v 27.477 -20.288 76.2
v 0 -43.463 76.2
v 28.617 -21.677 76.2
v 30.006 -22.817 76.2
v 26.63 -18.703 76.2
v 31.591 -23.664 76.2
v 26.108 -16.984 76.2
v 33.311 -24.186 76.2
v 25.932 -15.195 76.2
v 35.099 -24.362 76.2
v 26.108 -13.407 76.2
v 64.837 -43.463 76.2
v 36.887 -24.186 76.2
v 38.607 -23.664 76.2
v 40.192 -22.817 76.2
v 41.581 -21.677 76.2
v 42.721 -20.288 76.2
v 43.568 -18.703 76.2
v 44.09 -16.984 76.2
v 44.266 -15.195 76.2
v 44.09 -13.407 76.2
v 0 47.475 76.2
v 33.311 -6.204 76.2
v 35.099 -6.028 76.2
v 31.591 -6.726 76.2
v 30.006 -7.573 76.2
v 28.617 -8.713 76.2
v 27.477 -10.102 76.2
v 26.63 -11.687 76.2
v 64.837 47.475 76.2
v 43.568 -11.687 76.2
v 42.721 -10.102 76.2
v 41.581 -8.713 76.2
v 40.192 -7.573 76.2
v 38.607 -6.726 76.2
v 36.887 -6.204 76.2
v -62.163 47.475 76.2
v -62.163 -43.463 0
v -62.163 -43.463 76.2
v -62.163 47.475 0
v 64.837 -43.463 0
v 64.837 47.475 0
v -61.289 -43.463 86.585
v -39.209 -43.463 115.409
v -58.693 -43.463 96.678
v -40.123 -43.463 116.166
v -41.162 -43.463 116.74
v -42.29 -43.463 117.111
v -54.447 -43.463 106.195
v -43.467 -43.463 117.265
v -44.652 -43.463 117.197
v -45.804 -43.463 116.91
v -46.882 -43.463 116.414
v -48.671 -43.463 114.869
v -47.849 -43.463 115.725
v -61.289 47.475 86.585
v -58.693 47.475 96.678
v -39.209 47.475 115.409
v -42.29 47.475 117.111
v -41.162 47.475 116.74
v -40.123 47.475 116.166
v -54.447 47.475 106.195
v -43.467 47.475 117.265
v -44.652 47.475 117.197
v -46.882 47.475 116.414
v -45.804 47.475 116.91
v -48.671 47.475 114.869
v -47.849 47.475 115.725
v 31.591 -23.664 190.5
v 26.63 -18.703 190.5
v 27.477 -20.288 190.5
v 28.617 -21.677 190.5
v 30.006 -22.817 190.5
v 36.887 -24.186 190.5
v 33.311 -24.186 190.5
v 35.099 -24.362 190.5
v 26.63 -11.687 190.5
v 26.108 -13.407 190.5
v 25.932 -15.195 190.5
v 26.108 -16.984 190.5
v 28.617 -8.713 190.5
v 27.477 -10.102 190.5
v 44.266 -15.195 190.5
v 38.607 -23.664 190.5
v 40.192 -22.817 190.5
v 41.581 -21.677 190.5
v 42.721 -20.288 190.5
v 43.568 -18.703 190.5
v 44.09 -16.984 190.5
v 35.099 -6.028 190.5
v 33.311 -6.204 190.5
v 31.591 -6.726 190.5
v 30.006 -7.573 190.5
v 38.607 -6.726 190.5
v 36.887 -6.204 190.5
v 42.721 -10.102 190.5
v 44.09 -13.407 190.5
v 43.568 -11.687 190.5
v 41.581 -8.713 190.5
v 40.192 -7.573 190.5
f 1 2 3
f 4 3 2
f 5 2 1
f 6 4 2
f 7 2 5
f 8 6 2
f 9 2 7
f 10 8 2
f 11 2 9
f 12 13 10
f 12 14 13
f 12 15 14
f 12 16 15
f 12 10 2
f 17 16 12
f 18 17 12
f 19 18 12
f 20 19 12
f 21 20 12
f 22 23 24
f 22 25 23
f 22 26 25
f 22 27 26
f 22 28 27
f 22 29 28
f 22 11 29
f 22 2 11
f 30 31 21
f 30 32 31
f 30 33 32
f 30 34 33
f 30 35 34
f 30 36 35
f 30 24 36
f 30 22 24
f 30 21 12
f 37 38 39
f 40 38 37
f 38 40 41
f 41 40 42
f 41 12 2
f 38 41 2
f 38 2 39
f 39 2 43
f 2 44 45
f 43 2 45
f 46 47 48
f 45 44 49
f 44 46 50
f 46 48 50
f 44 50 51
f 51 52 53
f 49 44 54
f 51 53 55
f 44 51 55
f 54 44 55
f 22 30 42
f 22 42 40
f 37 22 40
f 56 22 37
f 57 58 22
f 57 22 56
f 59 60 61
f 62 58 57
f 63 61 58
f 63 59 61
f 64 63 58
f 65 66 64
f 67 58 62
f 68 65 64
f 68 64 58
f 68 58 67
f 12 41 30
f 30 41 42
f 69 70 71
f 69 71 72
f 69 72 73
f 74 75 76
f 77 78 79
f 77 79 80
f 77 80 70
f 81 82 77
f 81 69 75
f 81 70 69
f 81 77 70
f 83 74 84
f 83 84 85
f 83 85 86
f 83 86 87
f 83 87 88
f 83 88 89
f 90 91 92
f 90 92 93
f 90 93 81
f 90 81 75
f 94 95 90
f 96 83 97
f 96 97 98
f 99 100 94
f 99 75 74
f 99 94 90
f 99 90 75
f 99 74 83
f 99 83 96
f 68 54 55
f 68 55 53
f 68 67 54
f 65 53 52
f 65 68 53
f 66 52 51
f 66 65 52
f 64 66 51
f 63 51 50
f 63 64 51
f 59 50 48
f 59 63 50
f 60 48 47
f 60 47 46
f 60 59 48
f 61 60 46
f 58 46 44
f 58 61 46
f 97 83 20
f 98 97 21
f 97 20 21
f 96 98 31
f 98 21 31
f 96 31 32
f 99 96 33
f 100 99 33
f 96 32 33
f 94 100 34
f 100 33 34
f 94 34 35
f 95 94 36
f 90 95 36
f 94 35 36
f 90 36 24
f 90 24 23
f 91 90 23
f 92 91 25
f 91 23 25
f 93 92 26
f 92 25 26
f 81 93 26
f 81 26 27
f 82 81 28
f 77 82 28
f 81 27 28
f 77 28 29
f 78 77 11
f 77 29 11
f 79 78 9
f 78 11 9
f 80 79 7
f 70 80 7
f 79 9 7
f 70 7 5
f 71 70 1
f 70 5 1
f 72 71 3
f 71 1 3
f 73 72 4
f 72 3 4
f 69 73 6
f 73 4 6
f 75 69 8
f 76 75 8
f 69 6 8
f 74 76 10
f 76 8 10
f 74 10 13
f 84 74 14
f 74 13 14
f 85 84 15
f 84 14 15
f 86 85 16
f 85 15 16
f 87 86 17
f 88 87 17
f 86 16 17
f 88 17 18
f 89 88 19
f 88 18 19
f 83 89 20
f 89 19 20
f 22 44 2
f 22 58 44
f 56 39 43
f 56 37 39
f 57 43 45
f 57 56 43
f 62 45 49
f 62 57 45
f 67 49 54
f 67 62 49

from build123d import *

# Parameters (mm, degrees)
F0_W     = 127
F0_H     = 90.9382707423
F1_DEPTH = 76.2
F2_W     = 62.1625276506
F2_H     = 90.9382707423
F4_ANGLE = 45
F5_R     = 9.1670821984
F6_DEPTH = 114.3
F7_R     = 6.35


with BuildPart() as f1:
    # F0 (on Top) → F1 (new body)
    with BuildSketch(Plane.XY):
        with Locations((1.3374723494, 2.0061992109)):
            Rectangle(F0_W, F0_H)
    extrude(amount=F1_DEPTH)

    # F2 (on face) → F4 (revolve)
    with BuildSketch(Plane.XY.offset(76.2)):
        with Locations((-31.0812638253, 2.0061992109)):
            Rectangle(F2_W, F2_H)
    revolve(axis=Axis((0, 2.0061992109, 76.2), (0, 1, 0)), revolution_arc=F4_ANGLE)

    # F5 (on face) → F6 (join)
    with BuildSketch(Plane.XY.offset(76.2)):
        with Locations((35.0989550352, -15.1951536536)):
            Circle(F5_R)
    extrude(amount=F6_DEPTH)

    # F7
    f7_edges = [f1.edges().sort_by_distance(p)[0] for p in [
        (-43.955545, 2.006199, 120.155545),
    ]]
    fillet(f7_edges, radius=F7_R)


solid = f1.part
